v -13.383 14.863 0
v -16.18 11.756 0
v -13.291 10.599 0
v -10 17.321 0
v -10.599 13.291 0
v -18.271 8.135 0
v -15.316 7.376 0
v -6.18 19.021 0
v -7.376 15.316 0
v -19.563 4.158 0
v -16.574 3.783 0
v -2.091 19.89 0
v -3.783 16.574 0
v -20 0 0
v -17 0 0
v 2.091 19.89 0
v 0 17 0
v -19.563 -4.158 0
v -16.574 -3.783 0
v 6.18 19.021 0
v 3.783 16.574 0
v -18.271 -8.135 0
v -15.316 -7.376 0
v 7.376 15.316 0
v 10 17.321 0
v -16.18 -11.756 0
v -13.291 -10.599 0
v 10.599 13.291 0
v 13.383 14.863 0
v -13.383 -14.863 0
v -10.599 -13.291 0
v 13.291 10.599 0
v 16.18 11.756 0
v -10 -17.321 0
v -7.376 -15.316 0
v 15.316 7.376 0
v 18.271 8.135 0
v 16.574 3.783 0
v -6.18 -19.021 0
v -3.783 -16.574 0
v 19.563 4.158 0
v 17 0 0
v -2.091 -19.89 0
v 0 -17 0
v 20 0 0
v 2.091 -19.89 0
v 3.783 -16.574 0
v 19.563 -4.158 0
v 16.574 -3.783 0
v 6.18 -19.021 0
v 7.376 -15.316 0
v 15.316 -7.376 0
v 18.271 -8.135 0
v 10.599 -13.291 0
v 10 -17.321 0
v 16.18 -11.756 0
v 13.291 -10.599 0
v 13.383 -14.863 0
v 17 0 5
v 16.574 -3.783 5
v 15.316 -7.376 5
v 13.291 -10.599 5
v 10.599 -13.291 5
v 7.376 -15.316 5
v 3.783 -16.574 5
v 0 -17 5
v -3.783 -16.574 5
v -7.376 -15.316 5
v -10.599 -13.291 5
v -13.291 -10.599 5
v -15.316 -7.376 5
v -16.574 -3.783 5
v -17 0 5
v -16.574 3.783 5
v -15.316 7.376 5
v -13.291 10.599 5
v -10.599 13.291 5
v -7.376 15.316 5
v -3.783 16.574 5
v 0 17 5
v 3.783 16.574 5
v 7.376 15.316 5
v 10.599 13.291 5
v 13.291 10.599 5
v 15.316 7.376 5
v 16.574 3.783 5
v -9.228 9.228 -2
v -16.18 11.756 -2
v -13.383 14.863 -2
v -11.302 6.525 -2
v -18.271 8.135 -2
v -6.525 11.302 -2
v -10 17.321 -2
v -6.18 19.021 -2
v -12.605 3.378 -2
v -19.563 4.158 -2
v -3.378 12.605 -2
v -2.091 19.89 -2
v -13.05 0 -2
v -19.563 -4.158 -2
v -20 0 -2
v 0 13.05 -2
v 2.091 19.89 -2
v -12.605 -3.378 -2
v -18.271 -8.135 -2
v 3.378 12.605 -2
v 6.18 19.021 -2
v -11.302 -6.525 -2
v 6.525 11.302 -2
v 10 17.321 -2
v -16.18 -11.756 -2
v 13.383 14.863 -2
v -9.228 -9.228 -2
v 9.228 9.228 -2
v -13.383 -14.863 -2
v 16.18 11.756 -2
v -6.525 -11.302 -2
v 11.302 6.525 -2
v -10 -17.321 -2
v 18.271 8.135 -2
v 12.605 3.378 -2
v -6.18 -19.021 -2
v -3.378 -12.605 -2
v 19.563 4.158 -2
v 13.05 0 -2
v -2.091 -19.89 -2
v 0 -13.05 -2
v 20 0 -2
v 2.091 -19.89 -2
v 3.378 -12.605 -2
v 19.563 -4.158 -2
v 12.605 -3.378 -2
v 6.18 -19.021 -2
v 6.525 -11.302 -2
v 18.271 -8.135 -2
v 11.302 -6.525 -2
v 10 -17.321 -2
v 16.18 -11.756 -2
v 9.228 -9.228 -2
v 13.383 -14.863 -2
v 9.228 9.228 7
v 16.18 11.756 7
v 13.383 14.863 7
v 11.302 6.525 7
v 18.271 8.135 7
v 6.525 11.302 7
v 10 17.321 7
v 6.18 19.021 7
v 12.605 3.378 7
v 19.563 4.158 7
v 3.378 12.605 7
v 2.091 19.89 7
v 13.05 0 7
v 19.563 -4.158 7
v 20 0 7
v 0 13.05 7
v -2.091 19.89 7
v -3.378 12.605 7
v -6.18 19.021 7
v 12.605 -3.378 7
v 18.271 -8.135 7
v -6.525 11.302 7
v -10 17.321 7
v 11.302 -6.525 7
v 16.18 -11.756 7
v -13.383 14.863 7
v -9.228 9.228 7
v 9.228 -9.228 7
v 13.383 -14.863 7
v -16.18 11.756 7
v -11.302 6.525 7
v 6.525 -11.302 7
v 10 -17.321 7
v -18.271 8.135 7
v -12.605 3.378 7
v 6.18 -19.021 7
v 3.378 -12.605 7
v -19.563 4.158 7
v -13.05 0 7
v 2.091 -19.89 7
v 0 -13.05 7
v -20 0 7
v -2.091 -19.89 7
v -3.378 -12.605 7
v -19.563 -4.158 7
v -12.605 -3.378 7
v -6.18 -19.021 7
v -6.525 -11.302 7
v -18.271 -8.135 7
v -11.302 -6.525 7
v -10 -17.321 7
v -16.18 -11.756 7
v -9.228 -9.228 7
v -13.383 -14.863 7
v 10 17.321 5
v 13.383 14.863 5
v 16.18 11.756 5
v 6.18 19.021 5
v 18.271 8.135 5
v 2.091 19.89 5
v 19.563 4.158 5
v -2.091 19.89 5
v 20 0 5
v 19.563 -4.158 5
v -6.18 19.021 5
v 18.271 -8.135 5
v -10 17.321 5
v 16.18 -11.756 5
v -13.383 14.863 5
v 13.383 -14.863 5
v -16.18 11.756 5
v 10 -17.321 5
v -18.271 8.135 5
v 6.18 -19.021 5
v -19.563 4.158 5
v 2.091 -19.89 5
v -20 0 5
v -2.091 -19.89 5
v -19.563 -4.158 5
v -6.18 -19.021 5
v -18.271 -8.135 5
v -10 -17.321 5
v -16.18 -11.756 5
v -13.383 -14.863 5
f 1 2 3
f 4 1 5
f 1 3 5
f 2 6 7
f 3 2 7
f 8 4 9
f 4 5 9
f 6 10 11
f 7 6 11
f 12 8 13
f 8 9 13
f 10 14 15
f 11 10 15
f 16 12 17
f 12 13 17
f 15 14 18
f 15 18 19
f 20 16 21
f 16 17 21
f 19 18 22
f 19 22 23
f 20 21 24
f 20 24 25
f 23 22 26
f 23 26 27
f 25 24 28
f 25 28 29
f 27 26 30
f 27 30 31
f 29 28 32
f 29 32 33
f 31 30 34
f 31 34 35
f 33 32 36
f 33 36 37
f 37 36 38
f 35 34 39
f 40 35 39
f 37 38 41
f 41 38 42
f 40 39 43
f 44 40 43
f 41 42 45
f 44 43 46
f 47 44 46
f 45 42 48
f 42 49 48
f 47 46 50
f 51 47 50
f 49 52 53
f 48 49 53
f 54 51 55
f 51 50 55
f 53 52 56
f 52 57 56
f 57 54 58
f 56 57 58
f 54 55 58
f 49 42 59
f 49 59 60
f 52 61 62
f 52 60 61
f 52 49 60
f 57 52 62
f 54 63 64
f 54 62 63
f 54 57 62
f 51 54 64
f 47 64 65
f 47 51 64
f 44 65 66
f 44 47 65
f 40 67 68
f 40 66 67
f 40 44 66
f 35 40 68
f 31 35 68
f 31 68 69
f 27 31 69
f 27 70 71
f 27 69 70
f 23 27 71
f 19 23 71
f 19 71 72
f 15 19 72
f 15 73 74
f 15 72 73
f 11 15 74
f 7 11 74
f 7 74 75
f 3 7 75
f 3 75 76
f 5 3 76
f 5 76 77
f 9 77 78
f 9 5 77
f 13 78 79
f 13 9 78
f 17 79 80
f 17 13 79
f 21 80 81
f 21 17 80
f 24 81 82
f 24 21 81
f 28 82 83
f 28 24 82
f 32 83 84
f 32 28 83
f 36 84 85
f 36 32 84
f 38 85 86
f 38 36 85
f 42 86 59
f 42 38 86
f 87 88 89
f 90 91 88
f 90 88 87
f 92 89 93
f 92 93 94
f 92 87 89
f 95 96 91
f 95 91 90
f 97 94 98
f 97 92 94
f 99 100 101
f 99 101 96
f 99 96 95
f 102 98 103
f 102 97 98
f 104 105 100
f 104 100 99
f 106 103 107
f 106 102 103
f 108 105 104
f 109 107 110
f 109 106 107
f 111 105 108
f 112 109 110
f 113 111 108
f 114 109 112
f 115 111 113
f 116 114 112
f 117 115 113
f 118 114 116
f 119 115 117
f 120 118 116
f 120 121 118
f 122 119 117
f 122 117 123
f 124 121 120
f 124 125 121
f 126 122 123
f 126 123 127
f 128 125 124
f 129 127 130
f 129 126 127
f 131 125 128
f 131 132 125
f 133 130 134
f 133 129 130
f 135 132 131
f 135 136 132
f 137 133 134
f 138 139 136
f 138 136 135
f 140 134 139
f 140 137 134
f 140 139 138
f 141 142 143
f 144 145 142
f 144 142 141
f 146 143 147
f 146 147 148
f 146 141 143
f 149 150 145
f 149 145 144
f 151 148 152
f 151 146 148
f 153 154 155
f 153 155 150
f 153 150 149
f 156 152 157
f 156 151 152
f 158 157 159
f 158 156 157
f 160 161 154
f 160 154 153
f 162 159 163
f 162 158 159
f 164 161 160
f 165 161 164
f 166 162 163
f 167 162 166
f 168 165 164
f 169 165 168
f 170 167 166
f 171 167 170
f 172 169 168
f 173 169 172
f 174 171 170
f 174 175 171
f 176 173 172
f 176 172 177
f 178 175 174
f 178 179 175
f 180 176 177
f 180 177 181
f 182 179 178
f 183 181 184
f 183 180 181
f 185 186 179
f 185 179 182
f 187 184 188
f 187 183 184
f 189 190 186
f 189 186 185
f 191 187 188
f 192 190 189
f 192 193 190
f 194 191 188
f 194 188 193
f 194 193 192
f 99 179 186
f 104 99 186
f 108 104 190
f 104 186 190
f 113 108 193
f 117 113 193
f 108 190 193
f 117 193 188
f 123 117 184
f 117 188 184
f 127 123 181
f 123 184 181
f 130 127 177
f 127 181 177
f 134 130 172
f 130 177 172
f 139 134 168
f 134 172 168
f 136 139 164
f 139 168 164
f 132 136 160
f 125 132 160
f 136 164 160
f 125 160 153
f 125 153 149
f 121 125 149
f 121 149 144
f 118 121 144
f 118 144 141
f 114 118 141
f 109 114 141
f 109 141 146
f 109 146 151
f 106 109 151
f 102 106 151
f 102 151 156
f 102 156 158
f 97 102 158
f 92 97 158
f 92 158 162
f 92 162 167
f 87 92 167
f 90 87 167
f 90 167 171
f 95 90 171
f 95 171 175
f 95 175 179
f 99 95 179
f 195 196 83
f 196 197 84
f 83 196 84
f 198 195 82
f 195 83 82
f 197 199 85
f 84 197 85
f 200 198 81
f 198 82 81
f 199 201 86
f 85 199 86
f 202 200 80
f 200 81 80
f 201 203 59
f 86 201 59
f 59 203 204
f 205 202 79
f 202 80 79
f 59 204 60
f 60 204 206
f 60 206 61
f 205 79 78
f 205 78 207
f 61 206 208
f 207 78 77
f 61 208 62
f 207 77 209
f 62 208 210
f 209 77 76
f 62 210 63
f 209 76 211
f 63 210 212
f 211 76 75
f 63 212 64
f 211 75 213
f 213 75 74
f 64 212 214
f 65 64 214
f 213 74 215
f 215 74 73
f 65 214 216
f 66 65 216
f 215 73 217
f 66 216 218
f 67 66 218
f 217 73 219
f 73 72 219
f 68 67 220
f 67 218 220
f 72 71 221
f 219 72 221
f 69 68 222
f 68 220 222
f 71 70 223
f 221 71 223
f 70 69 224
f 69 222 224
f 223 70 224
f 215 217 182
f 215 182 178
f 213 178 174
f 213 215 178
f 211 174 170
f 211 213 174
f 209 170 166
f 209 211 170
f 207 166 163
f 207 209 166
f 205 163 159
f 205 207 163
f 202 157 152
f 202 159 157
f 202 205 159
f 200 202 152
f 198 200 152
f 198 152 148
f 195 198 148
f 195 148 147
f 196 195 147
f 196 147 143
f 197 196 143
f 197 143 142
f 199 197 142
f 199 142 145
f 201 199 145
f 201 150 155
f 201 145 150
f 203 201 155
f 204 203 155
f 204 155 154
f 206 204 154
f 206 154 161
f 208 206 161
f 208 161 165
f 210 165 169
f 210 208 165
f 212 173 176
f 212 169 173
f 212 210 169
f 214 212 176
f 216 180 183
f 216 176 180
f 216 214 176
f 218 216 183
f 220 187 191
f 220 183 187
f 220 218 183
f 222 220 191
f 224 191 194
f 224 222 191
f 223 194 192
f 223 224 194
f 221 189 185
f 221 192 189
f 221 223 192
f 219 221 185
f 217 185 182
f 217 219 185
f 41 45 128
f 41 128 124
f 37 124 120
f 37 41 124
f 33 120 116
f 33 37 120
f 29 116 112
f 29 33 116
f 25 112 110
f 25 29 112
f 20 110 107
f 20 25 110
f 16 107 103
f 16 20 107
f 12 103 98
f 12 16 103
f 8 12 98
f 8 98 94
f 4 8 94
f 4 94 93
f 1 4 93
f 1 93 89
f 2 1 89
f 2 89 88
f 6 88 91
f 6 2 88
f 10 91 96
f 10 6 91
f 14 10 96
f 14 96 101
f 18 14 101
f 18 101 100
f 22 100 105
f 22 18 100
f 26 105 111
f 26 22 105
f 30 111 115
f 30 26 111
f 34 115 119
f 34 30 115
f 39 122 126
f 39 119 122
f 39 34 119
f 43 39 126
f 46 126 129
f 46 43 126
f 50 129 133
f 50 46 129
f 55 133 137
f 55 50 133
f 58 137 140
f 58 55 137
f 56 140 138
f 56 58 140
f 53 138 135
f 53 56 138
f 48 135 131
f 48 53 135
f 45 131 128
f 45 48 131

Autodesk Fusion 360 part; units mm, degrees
sketch "Skizze1" plane through (0, 0, 0) normal (0, 0, 1) x (1, 0, 0)
  circle A0 centre (0, 0) radius 17
  dimension "d1" = 34
extrude "Extrusion1" add sketch "Skizze1" along normal blind 5
sketch "Skizze2" plane through (0, 0, 5) normal (0, 0, 1) x (-1, 0, 0)
  circle A0 centre (0, 0) radius 17
  circle A1 centre (0, 0) radius 20
  dimension "d5" = 40
extrude "Extrusion2" add sketch "Skizze2" along normal blind 2 contours A0 | A1
sketch "Skizze3" plane through (0, 0, 0) normal (0, 0, -1) x (1, 0, 0)
  circle A0 centre (0, 0) radius 17
  circle A1 centre (0, 0) radius 20
  dimension "d8" = 40
extrude "Extrusion3" add sketch "Skizze3" along normal blind 2 contours A0 | A1
sketch "Skizze4" plane through (0, 0, 7) normal (0, 0, 1) x (-1, 0, 0)
  circle A0 centre (0, 0) radius 20
  circle A1 centre (0, 0) radius 13.05
  dimension "d11" = 26.1
extrude "Extrusion4" cut sketch "Skizze4" against normal blind 23 contours A1
